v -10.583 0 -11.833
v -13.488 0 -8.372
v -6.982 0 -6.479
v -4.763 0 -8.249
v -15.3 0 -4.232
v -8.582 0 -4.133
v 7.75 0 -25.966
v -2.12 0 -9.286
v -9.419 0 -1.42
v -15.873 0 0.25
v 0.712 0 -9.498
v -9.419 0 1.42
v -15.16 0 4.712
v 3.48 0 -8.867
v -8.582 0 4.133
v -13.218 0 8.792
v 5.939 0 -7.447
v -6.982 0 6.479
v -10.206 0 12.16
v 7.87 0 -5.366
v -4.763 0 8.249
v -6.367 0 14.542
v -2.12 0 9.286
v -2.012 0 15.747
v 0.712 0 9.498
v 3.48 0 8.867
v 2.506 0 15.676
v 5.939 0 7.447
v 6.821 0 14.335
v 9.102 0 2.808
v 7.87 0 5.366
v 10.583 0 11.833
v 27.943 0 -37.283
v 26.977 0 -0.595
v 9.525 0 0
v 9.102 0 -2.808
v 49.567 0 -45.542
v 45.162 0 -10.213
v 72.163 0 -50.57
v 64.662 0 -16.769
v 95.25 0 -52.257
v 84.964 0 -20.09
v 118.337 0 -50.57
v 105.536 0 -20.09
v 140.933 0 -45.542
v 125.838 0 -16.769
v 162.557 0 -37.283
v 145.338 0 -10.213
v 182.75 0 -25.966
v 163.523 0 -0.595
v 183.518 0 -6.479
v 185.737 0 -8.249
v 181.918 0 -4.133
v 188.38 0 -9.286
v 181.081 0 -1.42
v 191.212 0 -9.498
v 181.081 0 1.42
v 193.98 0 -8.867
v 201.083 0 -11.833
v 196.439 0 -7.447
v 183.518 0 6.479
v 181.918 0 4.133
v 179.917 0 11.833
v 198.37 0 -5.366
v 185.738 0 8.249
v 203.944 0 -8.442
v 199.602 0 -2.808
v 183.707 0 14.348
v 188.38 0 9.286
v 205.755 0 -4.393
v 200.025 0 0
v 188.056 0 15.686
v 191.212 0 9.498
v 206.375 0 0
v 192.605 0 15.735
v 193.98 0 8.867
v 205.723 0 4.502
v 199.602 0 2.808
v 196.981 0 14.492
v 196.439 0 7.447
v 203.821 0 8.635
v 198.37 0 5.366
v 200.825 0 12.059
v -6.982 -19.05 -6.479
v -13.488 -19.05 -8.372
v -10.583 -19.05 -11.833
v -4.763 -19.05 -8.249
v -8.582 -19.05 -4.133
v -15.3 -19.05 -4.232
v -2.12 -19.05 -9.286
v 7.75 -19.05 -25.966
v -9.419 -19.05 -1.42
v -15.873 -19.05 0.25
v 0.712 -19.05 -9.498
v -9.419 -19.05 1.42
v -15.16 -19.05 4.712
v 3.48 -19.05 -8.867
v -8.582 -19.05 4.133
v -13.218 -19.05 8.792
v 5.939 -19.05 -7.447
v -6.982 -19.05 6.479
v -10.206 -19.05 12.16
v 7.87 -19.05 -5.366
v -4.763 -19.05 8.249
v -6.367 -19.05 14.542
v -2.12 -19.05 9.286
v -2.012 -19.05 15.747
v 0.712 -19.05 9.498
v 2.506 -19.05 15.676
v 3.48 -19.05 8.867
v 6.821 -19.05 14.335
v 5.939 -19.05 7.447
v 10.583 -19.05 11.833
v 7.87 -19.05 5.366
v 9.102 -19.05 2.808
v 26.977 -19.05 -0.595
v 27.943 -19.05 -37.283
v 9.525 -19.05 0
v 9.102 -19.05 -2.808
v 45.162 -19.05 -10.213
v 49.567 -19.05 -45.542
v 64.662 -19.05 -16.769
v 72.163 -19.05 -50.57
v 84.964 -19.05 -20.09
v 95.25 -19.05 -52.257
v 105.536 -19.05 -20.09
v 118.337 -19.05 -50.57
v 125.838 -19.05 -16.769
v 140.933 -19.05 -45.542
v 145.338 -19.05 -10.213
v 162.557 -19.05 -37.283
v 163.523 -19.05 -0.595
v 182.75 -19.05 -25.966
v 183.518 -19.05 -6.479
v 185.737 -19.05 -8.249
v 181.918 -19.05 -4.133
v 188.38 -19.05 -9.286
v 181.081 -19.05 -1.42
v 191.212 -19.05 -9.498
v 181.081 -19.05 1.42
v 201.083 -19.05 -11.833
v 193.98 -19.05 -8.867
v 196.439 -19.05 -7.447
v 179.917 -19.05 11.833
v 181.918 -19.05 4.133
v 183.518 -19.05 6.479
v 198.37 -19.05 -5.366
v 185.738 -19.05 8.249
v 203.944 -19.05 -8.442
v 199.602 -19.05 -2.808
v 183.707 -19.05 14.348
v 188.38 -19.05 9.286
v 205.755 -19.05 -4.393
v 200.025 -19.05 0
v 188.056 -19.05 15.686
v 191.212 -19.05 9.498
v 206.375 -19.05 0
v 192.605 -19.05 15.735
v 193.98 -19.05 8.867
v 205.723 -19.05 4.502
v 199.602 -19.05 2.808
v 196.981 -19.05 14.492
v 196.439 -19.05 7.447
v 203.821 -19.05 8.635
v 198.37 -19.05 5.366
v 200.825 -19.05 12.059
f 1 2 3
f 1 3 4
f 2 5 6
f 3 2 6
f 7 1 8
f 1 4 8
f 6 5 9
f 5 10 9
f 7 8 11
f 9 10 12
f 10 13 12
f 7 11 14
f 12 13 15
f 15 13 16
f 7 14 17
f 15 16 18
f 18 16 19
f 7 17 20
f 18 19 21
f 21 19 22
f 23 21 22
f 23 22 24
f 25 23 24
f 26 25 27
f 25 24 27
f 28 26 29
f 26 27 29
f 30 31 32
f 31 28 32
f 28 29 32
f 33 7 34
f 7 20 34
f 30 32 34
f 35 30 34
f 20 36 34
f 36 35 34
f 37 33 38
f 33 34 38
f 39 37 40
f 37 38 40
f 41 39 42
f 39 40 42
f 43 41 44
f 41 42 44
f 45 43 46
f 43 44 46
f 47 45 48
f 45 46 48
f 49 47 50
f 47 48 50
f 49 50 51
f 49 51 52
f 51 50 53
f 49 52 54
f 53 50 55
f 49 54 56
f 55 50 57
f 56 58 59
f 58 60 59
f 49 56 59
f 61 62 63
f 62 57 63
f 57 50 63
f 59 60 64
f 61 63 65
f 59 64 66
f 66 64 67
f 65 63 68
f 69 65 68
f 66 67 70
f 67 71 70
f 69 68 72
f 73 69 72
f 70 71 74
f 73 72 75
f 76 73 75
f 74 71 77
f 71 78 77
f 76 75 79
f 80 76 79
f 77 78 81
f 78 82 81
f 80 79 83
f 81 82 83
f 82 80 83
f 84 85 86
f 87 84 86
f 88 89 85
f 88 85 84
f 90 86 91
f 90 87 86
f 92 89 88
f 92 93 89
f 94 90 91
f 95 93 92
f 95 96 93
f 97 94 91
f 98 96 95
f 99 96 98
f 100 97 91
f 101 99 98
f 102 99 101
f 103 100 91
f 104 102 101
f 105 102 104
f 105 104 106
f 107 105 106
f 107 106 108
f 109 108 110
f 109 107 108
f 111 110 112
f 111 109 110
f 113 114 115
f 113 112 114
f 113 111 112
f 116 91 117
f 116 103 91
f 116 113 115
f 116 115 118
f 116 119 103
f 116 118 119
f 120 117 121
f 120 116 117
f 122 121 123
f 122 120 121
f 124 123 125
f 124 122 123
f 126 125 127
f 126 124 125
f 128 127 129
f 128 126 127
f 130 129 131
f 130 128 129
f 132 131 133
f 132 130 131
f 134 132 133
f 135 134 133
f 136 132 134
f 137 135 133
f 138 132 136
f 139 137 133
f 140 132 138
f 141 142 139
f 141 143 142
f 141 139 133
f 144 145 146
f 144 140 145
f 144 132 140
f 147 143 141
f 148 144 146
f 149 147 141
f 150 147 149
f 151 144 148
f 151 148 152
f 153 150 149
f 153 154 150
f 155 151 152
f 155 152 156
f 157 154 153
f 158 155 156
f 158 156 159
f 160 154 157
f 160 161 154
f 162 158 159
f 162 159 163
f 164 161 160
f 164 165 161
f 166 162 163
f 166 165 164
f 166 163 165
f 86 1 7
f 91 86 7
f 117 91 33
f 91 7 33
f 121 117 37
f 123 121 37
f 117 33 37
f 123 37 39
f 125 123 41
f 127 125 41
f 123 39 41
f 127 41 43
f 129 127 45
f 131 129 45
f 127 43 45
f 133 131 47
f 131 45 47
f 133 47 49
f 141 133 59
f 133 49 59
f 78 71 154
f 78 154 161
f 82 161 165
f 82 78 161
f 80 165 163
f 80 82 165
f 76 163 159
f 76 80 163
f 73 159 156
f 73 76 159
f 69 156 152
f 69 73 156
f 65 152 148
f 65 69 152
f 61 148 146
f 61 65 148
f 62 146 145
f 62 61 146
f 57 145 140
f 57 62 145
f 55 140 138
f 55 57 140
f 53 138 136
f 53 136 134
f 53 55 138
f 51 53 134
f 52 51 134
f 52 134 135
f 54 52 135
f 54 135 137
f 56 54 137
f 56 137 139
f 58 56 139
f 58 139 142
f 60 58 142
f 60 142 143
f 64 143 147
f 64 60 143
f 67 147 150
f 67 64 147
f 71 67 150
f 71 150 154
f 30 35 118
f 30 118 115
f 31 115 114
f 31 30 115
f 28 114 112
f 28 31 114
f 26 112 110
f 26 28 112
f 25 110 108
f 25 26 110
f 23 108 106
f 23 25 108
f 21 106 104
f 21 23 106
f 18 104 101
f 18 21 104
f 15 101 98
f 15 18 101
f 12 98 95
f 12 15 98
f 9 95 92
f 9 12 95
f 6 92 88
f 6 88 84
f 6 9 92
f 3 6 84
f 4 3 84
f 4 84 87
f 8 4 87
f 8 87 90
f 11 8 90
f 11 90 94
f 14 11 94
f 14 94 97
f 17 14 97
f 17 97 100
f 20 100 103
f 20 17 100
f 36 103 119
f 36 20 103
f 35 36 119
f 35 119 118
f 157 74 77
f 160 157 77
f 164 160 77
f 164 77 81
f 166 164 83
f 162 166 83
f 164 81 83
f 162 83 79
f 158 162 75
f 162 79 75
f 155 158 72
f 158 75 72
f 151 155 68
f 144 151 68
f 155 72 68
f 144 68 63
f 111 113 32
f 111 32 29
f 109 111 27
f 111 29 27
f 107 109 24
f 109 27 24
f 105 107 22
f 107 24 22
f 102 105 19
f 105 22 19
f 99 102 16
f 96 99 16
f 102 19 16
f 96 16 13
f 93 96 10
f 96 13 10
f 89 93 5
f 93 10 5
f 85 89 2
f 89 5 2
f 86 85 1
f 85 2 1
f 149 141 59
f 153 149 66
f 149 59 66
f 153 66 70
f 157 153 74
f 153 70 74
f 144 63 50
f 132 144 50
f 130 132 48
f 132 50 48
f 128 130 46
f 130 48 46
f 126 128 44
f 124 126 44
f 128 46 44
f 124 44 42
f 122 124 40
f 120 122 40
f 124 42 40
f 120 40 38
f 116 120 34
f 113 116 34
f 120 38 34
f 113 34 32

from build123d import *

# Parameters (mm, degrees)
F0_R     = 9.525
F1_DEPTH = 19.05


with BuildPart() as f1:
    # F0 (on Front) → F1 (new body)
    with BuildSketch(Plane.XZ):
        with BuildLine():
            ThreePointArc((10.583333, 11.832526), (14.491826, 6.480942), (15.875, 0))
            ThreePointArc((15.875, 0), (6.480942, -14.491826), (-10.583333, -11.832526))
            ThreePointArc((-10.583333, -11.832526), (95.25, -52.257263), (201.083333, -11.832526))
            ThreePointArc((201.083333, -11.832526), (178.667474, -10.583333), (179.916667, 11.832526))
            ThreePointArc((179.916667, 11.832526), (95.25, -20.507263), (10.583333, 11.832526))
        make_face()
        with BuildLine():
            ThreePointArc((-10.583333, -11.832526), (6.480942, -14.491826), (15.875, 0))
            ThreePointArc((15.875, 0), (14.491826, 6.480942), (10.583333, 11.832526))
            ThreePointArc((10.583333, 11.832526), (-11.832526, 10.583333), (-10.583333, -11.832526))
        make_face()
        Circle(F0_R, mode=Mode.SUBTRACT)
        with BuildLine():
            ThreePointArc((206.375, 0), (196.980942, 14.491826), (179.916667, 11.832526))
            ThreePointArc((179.916667, 11.832526), (178.667474, -10.583333), (201.083333, -11.832526))
            ThreePointArc((201.083333, -11.832526), (204.991826, -6.480942), (206.375, 0))
        make_face()
        with Locations((190.5, 0)):
            Circle(F0_R, mode=Mode.SUBTRACT)
    extrude(amount=F1_DEPTH)


solid = f1.part
